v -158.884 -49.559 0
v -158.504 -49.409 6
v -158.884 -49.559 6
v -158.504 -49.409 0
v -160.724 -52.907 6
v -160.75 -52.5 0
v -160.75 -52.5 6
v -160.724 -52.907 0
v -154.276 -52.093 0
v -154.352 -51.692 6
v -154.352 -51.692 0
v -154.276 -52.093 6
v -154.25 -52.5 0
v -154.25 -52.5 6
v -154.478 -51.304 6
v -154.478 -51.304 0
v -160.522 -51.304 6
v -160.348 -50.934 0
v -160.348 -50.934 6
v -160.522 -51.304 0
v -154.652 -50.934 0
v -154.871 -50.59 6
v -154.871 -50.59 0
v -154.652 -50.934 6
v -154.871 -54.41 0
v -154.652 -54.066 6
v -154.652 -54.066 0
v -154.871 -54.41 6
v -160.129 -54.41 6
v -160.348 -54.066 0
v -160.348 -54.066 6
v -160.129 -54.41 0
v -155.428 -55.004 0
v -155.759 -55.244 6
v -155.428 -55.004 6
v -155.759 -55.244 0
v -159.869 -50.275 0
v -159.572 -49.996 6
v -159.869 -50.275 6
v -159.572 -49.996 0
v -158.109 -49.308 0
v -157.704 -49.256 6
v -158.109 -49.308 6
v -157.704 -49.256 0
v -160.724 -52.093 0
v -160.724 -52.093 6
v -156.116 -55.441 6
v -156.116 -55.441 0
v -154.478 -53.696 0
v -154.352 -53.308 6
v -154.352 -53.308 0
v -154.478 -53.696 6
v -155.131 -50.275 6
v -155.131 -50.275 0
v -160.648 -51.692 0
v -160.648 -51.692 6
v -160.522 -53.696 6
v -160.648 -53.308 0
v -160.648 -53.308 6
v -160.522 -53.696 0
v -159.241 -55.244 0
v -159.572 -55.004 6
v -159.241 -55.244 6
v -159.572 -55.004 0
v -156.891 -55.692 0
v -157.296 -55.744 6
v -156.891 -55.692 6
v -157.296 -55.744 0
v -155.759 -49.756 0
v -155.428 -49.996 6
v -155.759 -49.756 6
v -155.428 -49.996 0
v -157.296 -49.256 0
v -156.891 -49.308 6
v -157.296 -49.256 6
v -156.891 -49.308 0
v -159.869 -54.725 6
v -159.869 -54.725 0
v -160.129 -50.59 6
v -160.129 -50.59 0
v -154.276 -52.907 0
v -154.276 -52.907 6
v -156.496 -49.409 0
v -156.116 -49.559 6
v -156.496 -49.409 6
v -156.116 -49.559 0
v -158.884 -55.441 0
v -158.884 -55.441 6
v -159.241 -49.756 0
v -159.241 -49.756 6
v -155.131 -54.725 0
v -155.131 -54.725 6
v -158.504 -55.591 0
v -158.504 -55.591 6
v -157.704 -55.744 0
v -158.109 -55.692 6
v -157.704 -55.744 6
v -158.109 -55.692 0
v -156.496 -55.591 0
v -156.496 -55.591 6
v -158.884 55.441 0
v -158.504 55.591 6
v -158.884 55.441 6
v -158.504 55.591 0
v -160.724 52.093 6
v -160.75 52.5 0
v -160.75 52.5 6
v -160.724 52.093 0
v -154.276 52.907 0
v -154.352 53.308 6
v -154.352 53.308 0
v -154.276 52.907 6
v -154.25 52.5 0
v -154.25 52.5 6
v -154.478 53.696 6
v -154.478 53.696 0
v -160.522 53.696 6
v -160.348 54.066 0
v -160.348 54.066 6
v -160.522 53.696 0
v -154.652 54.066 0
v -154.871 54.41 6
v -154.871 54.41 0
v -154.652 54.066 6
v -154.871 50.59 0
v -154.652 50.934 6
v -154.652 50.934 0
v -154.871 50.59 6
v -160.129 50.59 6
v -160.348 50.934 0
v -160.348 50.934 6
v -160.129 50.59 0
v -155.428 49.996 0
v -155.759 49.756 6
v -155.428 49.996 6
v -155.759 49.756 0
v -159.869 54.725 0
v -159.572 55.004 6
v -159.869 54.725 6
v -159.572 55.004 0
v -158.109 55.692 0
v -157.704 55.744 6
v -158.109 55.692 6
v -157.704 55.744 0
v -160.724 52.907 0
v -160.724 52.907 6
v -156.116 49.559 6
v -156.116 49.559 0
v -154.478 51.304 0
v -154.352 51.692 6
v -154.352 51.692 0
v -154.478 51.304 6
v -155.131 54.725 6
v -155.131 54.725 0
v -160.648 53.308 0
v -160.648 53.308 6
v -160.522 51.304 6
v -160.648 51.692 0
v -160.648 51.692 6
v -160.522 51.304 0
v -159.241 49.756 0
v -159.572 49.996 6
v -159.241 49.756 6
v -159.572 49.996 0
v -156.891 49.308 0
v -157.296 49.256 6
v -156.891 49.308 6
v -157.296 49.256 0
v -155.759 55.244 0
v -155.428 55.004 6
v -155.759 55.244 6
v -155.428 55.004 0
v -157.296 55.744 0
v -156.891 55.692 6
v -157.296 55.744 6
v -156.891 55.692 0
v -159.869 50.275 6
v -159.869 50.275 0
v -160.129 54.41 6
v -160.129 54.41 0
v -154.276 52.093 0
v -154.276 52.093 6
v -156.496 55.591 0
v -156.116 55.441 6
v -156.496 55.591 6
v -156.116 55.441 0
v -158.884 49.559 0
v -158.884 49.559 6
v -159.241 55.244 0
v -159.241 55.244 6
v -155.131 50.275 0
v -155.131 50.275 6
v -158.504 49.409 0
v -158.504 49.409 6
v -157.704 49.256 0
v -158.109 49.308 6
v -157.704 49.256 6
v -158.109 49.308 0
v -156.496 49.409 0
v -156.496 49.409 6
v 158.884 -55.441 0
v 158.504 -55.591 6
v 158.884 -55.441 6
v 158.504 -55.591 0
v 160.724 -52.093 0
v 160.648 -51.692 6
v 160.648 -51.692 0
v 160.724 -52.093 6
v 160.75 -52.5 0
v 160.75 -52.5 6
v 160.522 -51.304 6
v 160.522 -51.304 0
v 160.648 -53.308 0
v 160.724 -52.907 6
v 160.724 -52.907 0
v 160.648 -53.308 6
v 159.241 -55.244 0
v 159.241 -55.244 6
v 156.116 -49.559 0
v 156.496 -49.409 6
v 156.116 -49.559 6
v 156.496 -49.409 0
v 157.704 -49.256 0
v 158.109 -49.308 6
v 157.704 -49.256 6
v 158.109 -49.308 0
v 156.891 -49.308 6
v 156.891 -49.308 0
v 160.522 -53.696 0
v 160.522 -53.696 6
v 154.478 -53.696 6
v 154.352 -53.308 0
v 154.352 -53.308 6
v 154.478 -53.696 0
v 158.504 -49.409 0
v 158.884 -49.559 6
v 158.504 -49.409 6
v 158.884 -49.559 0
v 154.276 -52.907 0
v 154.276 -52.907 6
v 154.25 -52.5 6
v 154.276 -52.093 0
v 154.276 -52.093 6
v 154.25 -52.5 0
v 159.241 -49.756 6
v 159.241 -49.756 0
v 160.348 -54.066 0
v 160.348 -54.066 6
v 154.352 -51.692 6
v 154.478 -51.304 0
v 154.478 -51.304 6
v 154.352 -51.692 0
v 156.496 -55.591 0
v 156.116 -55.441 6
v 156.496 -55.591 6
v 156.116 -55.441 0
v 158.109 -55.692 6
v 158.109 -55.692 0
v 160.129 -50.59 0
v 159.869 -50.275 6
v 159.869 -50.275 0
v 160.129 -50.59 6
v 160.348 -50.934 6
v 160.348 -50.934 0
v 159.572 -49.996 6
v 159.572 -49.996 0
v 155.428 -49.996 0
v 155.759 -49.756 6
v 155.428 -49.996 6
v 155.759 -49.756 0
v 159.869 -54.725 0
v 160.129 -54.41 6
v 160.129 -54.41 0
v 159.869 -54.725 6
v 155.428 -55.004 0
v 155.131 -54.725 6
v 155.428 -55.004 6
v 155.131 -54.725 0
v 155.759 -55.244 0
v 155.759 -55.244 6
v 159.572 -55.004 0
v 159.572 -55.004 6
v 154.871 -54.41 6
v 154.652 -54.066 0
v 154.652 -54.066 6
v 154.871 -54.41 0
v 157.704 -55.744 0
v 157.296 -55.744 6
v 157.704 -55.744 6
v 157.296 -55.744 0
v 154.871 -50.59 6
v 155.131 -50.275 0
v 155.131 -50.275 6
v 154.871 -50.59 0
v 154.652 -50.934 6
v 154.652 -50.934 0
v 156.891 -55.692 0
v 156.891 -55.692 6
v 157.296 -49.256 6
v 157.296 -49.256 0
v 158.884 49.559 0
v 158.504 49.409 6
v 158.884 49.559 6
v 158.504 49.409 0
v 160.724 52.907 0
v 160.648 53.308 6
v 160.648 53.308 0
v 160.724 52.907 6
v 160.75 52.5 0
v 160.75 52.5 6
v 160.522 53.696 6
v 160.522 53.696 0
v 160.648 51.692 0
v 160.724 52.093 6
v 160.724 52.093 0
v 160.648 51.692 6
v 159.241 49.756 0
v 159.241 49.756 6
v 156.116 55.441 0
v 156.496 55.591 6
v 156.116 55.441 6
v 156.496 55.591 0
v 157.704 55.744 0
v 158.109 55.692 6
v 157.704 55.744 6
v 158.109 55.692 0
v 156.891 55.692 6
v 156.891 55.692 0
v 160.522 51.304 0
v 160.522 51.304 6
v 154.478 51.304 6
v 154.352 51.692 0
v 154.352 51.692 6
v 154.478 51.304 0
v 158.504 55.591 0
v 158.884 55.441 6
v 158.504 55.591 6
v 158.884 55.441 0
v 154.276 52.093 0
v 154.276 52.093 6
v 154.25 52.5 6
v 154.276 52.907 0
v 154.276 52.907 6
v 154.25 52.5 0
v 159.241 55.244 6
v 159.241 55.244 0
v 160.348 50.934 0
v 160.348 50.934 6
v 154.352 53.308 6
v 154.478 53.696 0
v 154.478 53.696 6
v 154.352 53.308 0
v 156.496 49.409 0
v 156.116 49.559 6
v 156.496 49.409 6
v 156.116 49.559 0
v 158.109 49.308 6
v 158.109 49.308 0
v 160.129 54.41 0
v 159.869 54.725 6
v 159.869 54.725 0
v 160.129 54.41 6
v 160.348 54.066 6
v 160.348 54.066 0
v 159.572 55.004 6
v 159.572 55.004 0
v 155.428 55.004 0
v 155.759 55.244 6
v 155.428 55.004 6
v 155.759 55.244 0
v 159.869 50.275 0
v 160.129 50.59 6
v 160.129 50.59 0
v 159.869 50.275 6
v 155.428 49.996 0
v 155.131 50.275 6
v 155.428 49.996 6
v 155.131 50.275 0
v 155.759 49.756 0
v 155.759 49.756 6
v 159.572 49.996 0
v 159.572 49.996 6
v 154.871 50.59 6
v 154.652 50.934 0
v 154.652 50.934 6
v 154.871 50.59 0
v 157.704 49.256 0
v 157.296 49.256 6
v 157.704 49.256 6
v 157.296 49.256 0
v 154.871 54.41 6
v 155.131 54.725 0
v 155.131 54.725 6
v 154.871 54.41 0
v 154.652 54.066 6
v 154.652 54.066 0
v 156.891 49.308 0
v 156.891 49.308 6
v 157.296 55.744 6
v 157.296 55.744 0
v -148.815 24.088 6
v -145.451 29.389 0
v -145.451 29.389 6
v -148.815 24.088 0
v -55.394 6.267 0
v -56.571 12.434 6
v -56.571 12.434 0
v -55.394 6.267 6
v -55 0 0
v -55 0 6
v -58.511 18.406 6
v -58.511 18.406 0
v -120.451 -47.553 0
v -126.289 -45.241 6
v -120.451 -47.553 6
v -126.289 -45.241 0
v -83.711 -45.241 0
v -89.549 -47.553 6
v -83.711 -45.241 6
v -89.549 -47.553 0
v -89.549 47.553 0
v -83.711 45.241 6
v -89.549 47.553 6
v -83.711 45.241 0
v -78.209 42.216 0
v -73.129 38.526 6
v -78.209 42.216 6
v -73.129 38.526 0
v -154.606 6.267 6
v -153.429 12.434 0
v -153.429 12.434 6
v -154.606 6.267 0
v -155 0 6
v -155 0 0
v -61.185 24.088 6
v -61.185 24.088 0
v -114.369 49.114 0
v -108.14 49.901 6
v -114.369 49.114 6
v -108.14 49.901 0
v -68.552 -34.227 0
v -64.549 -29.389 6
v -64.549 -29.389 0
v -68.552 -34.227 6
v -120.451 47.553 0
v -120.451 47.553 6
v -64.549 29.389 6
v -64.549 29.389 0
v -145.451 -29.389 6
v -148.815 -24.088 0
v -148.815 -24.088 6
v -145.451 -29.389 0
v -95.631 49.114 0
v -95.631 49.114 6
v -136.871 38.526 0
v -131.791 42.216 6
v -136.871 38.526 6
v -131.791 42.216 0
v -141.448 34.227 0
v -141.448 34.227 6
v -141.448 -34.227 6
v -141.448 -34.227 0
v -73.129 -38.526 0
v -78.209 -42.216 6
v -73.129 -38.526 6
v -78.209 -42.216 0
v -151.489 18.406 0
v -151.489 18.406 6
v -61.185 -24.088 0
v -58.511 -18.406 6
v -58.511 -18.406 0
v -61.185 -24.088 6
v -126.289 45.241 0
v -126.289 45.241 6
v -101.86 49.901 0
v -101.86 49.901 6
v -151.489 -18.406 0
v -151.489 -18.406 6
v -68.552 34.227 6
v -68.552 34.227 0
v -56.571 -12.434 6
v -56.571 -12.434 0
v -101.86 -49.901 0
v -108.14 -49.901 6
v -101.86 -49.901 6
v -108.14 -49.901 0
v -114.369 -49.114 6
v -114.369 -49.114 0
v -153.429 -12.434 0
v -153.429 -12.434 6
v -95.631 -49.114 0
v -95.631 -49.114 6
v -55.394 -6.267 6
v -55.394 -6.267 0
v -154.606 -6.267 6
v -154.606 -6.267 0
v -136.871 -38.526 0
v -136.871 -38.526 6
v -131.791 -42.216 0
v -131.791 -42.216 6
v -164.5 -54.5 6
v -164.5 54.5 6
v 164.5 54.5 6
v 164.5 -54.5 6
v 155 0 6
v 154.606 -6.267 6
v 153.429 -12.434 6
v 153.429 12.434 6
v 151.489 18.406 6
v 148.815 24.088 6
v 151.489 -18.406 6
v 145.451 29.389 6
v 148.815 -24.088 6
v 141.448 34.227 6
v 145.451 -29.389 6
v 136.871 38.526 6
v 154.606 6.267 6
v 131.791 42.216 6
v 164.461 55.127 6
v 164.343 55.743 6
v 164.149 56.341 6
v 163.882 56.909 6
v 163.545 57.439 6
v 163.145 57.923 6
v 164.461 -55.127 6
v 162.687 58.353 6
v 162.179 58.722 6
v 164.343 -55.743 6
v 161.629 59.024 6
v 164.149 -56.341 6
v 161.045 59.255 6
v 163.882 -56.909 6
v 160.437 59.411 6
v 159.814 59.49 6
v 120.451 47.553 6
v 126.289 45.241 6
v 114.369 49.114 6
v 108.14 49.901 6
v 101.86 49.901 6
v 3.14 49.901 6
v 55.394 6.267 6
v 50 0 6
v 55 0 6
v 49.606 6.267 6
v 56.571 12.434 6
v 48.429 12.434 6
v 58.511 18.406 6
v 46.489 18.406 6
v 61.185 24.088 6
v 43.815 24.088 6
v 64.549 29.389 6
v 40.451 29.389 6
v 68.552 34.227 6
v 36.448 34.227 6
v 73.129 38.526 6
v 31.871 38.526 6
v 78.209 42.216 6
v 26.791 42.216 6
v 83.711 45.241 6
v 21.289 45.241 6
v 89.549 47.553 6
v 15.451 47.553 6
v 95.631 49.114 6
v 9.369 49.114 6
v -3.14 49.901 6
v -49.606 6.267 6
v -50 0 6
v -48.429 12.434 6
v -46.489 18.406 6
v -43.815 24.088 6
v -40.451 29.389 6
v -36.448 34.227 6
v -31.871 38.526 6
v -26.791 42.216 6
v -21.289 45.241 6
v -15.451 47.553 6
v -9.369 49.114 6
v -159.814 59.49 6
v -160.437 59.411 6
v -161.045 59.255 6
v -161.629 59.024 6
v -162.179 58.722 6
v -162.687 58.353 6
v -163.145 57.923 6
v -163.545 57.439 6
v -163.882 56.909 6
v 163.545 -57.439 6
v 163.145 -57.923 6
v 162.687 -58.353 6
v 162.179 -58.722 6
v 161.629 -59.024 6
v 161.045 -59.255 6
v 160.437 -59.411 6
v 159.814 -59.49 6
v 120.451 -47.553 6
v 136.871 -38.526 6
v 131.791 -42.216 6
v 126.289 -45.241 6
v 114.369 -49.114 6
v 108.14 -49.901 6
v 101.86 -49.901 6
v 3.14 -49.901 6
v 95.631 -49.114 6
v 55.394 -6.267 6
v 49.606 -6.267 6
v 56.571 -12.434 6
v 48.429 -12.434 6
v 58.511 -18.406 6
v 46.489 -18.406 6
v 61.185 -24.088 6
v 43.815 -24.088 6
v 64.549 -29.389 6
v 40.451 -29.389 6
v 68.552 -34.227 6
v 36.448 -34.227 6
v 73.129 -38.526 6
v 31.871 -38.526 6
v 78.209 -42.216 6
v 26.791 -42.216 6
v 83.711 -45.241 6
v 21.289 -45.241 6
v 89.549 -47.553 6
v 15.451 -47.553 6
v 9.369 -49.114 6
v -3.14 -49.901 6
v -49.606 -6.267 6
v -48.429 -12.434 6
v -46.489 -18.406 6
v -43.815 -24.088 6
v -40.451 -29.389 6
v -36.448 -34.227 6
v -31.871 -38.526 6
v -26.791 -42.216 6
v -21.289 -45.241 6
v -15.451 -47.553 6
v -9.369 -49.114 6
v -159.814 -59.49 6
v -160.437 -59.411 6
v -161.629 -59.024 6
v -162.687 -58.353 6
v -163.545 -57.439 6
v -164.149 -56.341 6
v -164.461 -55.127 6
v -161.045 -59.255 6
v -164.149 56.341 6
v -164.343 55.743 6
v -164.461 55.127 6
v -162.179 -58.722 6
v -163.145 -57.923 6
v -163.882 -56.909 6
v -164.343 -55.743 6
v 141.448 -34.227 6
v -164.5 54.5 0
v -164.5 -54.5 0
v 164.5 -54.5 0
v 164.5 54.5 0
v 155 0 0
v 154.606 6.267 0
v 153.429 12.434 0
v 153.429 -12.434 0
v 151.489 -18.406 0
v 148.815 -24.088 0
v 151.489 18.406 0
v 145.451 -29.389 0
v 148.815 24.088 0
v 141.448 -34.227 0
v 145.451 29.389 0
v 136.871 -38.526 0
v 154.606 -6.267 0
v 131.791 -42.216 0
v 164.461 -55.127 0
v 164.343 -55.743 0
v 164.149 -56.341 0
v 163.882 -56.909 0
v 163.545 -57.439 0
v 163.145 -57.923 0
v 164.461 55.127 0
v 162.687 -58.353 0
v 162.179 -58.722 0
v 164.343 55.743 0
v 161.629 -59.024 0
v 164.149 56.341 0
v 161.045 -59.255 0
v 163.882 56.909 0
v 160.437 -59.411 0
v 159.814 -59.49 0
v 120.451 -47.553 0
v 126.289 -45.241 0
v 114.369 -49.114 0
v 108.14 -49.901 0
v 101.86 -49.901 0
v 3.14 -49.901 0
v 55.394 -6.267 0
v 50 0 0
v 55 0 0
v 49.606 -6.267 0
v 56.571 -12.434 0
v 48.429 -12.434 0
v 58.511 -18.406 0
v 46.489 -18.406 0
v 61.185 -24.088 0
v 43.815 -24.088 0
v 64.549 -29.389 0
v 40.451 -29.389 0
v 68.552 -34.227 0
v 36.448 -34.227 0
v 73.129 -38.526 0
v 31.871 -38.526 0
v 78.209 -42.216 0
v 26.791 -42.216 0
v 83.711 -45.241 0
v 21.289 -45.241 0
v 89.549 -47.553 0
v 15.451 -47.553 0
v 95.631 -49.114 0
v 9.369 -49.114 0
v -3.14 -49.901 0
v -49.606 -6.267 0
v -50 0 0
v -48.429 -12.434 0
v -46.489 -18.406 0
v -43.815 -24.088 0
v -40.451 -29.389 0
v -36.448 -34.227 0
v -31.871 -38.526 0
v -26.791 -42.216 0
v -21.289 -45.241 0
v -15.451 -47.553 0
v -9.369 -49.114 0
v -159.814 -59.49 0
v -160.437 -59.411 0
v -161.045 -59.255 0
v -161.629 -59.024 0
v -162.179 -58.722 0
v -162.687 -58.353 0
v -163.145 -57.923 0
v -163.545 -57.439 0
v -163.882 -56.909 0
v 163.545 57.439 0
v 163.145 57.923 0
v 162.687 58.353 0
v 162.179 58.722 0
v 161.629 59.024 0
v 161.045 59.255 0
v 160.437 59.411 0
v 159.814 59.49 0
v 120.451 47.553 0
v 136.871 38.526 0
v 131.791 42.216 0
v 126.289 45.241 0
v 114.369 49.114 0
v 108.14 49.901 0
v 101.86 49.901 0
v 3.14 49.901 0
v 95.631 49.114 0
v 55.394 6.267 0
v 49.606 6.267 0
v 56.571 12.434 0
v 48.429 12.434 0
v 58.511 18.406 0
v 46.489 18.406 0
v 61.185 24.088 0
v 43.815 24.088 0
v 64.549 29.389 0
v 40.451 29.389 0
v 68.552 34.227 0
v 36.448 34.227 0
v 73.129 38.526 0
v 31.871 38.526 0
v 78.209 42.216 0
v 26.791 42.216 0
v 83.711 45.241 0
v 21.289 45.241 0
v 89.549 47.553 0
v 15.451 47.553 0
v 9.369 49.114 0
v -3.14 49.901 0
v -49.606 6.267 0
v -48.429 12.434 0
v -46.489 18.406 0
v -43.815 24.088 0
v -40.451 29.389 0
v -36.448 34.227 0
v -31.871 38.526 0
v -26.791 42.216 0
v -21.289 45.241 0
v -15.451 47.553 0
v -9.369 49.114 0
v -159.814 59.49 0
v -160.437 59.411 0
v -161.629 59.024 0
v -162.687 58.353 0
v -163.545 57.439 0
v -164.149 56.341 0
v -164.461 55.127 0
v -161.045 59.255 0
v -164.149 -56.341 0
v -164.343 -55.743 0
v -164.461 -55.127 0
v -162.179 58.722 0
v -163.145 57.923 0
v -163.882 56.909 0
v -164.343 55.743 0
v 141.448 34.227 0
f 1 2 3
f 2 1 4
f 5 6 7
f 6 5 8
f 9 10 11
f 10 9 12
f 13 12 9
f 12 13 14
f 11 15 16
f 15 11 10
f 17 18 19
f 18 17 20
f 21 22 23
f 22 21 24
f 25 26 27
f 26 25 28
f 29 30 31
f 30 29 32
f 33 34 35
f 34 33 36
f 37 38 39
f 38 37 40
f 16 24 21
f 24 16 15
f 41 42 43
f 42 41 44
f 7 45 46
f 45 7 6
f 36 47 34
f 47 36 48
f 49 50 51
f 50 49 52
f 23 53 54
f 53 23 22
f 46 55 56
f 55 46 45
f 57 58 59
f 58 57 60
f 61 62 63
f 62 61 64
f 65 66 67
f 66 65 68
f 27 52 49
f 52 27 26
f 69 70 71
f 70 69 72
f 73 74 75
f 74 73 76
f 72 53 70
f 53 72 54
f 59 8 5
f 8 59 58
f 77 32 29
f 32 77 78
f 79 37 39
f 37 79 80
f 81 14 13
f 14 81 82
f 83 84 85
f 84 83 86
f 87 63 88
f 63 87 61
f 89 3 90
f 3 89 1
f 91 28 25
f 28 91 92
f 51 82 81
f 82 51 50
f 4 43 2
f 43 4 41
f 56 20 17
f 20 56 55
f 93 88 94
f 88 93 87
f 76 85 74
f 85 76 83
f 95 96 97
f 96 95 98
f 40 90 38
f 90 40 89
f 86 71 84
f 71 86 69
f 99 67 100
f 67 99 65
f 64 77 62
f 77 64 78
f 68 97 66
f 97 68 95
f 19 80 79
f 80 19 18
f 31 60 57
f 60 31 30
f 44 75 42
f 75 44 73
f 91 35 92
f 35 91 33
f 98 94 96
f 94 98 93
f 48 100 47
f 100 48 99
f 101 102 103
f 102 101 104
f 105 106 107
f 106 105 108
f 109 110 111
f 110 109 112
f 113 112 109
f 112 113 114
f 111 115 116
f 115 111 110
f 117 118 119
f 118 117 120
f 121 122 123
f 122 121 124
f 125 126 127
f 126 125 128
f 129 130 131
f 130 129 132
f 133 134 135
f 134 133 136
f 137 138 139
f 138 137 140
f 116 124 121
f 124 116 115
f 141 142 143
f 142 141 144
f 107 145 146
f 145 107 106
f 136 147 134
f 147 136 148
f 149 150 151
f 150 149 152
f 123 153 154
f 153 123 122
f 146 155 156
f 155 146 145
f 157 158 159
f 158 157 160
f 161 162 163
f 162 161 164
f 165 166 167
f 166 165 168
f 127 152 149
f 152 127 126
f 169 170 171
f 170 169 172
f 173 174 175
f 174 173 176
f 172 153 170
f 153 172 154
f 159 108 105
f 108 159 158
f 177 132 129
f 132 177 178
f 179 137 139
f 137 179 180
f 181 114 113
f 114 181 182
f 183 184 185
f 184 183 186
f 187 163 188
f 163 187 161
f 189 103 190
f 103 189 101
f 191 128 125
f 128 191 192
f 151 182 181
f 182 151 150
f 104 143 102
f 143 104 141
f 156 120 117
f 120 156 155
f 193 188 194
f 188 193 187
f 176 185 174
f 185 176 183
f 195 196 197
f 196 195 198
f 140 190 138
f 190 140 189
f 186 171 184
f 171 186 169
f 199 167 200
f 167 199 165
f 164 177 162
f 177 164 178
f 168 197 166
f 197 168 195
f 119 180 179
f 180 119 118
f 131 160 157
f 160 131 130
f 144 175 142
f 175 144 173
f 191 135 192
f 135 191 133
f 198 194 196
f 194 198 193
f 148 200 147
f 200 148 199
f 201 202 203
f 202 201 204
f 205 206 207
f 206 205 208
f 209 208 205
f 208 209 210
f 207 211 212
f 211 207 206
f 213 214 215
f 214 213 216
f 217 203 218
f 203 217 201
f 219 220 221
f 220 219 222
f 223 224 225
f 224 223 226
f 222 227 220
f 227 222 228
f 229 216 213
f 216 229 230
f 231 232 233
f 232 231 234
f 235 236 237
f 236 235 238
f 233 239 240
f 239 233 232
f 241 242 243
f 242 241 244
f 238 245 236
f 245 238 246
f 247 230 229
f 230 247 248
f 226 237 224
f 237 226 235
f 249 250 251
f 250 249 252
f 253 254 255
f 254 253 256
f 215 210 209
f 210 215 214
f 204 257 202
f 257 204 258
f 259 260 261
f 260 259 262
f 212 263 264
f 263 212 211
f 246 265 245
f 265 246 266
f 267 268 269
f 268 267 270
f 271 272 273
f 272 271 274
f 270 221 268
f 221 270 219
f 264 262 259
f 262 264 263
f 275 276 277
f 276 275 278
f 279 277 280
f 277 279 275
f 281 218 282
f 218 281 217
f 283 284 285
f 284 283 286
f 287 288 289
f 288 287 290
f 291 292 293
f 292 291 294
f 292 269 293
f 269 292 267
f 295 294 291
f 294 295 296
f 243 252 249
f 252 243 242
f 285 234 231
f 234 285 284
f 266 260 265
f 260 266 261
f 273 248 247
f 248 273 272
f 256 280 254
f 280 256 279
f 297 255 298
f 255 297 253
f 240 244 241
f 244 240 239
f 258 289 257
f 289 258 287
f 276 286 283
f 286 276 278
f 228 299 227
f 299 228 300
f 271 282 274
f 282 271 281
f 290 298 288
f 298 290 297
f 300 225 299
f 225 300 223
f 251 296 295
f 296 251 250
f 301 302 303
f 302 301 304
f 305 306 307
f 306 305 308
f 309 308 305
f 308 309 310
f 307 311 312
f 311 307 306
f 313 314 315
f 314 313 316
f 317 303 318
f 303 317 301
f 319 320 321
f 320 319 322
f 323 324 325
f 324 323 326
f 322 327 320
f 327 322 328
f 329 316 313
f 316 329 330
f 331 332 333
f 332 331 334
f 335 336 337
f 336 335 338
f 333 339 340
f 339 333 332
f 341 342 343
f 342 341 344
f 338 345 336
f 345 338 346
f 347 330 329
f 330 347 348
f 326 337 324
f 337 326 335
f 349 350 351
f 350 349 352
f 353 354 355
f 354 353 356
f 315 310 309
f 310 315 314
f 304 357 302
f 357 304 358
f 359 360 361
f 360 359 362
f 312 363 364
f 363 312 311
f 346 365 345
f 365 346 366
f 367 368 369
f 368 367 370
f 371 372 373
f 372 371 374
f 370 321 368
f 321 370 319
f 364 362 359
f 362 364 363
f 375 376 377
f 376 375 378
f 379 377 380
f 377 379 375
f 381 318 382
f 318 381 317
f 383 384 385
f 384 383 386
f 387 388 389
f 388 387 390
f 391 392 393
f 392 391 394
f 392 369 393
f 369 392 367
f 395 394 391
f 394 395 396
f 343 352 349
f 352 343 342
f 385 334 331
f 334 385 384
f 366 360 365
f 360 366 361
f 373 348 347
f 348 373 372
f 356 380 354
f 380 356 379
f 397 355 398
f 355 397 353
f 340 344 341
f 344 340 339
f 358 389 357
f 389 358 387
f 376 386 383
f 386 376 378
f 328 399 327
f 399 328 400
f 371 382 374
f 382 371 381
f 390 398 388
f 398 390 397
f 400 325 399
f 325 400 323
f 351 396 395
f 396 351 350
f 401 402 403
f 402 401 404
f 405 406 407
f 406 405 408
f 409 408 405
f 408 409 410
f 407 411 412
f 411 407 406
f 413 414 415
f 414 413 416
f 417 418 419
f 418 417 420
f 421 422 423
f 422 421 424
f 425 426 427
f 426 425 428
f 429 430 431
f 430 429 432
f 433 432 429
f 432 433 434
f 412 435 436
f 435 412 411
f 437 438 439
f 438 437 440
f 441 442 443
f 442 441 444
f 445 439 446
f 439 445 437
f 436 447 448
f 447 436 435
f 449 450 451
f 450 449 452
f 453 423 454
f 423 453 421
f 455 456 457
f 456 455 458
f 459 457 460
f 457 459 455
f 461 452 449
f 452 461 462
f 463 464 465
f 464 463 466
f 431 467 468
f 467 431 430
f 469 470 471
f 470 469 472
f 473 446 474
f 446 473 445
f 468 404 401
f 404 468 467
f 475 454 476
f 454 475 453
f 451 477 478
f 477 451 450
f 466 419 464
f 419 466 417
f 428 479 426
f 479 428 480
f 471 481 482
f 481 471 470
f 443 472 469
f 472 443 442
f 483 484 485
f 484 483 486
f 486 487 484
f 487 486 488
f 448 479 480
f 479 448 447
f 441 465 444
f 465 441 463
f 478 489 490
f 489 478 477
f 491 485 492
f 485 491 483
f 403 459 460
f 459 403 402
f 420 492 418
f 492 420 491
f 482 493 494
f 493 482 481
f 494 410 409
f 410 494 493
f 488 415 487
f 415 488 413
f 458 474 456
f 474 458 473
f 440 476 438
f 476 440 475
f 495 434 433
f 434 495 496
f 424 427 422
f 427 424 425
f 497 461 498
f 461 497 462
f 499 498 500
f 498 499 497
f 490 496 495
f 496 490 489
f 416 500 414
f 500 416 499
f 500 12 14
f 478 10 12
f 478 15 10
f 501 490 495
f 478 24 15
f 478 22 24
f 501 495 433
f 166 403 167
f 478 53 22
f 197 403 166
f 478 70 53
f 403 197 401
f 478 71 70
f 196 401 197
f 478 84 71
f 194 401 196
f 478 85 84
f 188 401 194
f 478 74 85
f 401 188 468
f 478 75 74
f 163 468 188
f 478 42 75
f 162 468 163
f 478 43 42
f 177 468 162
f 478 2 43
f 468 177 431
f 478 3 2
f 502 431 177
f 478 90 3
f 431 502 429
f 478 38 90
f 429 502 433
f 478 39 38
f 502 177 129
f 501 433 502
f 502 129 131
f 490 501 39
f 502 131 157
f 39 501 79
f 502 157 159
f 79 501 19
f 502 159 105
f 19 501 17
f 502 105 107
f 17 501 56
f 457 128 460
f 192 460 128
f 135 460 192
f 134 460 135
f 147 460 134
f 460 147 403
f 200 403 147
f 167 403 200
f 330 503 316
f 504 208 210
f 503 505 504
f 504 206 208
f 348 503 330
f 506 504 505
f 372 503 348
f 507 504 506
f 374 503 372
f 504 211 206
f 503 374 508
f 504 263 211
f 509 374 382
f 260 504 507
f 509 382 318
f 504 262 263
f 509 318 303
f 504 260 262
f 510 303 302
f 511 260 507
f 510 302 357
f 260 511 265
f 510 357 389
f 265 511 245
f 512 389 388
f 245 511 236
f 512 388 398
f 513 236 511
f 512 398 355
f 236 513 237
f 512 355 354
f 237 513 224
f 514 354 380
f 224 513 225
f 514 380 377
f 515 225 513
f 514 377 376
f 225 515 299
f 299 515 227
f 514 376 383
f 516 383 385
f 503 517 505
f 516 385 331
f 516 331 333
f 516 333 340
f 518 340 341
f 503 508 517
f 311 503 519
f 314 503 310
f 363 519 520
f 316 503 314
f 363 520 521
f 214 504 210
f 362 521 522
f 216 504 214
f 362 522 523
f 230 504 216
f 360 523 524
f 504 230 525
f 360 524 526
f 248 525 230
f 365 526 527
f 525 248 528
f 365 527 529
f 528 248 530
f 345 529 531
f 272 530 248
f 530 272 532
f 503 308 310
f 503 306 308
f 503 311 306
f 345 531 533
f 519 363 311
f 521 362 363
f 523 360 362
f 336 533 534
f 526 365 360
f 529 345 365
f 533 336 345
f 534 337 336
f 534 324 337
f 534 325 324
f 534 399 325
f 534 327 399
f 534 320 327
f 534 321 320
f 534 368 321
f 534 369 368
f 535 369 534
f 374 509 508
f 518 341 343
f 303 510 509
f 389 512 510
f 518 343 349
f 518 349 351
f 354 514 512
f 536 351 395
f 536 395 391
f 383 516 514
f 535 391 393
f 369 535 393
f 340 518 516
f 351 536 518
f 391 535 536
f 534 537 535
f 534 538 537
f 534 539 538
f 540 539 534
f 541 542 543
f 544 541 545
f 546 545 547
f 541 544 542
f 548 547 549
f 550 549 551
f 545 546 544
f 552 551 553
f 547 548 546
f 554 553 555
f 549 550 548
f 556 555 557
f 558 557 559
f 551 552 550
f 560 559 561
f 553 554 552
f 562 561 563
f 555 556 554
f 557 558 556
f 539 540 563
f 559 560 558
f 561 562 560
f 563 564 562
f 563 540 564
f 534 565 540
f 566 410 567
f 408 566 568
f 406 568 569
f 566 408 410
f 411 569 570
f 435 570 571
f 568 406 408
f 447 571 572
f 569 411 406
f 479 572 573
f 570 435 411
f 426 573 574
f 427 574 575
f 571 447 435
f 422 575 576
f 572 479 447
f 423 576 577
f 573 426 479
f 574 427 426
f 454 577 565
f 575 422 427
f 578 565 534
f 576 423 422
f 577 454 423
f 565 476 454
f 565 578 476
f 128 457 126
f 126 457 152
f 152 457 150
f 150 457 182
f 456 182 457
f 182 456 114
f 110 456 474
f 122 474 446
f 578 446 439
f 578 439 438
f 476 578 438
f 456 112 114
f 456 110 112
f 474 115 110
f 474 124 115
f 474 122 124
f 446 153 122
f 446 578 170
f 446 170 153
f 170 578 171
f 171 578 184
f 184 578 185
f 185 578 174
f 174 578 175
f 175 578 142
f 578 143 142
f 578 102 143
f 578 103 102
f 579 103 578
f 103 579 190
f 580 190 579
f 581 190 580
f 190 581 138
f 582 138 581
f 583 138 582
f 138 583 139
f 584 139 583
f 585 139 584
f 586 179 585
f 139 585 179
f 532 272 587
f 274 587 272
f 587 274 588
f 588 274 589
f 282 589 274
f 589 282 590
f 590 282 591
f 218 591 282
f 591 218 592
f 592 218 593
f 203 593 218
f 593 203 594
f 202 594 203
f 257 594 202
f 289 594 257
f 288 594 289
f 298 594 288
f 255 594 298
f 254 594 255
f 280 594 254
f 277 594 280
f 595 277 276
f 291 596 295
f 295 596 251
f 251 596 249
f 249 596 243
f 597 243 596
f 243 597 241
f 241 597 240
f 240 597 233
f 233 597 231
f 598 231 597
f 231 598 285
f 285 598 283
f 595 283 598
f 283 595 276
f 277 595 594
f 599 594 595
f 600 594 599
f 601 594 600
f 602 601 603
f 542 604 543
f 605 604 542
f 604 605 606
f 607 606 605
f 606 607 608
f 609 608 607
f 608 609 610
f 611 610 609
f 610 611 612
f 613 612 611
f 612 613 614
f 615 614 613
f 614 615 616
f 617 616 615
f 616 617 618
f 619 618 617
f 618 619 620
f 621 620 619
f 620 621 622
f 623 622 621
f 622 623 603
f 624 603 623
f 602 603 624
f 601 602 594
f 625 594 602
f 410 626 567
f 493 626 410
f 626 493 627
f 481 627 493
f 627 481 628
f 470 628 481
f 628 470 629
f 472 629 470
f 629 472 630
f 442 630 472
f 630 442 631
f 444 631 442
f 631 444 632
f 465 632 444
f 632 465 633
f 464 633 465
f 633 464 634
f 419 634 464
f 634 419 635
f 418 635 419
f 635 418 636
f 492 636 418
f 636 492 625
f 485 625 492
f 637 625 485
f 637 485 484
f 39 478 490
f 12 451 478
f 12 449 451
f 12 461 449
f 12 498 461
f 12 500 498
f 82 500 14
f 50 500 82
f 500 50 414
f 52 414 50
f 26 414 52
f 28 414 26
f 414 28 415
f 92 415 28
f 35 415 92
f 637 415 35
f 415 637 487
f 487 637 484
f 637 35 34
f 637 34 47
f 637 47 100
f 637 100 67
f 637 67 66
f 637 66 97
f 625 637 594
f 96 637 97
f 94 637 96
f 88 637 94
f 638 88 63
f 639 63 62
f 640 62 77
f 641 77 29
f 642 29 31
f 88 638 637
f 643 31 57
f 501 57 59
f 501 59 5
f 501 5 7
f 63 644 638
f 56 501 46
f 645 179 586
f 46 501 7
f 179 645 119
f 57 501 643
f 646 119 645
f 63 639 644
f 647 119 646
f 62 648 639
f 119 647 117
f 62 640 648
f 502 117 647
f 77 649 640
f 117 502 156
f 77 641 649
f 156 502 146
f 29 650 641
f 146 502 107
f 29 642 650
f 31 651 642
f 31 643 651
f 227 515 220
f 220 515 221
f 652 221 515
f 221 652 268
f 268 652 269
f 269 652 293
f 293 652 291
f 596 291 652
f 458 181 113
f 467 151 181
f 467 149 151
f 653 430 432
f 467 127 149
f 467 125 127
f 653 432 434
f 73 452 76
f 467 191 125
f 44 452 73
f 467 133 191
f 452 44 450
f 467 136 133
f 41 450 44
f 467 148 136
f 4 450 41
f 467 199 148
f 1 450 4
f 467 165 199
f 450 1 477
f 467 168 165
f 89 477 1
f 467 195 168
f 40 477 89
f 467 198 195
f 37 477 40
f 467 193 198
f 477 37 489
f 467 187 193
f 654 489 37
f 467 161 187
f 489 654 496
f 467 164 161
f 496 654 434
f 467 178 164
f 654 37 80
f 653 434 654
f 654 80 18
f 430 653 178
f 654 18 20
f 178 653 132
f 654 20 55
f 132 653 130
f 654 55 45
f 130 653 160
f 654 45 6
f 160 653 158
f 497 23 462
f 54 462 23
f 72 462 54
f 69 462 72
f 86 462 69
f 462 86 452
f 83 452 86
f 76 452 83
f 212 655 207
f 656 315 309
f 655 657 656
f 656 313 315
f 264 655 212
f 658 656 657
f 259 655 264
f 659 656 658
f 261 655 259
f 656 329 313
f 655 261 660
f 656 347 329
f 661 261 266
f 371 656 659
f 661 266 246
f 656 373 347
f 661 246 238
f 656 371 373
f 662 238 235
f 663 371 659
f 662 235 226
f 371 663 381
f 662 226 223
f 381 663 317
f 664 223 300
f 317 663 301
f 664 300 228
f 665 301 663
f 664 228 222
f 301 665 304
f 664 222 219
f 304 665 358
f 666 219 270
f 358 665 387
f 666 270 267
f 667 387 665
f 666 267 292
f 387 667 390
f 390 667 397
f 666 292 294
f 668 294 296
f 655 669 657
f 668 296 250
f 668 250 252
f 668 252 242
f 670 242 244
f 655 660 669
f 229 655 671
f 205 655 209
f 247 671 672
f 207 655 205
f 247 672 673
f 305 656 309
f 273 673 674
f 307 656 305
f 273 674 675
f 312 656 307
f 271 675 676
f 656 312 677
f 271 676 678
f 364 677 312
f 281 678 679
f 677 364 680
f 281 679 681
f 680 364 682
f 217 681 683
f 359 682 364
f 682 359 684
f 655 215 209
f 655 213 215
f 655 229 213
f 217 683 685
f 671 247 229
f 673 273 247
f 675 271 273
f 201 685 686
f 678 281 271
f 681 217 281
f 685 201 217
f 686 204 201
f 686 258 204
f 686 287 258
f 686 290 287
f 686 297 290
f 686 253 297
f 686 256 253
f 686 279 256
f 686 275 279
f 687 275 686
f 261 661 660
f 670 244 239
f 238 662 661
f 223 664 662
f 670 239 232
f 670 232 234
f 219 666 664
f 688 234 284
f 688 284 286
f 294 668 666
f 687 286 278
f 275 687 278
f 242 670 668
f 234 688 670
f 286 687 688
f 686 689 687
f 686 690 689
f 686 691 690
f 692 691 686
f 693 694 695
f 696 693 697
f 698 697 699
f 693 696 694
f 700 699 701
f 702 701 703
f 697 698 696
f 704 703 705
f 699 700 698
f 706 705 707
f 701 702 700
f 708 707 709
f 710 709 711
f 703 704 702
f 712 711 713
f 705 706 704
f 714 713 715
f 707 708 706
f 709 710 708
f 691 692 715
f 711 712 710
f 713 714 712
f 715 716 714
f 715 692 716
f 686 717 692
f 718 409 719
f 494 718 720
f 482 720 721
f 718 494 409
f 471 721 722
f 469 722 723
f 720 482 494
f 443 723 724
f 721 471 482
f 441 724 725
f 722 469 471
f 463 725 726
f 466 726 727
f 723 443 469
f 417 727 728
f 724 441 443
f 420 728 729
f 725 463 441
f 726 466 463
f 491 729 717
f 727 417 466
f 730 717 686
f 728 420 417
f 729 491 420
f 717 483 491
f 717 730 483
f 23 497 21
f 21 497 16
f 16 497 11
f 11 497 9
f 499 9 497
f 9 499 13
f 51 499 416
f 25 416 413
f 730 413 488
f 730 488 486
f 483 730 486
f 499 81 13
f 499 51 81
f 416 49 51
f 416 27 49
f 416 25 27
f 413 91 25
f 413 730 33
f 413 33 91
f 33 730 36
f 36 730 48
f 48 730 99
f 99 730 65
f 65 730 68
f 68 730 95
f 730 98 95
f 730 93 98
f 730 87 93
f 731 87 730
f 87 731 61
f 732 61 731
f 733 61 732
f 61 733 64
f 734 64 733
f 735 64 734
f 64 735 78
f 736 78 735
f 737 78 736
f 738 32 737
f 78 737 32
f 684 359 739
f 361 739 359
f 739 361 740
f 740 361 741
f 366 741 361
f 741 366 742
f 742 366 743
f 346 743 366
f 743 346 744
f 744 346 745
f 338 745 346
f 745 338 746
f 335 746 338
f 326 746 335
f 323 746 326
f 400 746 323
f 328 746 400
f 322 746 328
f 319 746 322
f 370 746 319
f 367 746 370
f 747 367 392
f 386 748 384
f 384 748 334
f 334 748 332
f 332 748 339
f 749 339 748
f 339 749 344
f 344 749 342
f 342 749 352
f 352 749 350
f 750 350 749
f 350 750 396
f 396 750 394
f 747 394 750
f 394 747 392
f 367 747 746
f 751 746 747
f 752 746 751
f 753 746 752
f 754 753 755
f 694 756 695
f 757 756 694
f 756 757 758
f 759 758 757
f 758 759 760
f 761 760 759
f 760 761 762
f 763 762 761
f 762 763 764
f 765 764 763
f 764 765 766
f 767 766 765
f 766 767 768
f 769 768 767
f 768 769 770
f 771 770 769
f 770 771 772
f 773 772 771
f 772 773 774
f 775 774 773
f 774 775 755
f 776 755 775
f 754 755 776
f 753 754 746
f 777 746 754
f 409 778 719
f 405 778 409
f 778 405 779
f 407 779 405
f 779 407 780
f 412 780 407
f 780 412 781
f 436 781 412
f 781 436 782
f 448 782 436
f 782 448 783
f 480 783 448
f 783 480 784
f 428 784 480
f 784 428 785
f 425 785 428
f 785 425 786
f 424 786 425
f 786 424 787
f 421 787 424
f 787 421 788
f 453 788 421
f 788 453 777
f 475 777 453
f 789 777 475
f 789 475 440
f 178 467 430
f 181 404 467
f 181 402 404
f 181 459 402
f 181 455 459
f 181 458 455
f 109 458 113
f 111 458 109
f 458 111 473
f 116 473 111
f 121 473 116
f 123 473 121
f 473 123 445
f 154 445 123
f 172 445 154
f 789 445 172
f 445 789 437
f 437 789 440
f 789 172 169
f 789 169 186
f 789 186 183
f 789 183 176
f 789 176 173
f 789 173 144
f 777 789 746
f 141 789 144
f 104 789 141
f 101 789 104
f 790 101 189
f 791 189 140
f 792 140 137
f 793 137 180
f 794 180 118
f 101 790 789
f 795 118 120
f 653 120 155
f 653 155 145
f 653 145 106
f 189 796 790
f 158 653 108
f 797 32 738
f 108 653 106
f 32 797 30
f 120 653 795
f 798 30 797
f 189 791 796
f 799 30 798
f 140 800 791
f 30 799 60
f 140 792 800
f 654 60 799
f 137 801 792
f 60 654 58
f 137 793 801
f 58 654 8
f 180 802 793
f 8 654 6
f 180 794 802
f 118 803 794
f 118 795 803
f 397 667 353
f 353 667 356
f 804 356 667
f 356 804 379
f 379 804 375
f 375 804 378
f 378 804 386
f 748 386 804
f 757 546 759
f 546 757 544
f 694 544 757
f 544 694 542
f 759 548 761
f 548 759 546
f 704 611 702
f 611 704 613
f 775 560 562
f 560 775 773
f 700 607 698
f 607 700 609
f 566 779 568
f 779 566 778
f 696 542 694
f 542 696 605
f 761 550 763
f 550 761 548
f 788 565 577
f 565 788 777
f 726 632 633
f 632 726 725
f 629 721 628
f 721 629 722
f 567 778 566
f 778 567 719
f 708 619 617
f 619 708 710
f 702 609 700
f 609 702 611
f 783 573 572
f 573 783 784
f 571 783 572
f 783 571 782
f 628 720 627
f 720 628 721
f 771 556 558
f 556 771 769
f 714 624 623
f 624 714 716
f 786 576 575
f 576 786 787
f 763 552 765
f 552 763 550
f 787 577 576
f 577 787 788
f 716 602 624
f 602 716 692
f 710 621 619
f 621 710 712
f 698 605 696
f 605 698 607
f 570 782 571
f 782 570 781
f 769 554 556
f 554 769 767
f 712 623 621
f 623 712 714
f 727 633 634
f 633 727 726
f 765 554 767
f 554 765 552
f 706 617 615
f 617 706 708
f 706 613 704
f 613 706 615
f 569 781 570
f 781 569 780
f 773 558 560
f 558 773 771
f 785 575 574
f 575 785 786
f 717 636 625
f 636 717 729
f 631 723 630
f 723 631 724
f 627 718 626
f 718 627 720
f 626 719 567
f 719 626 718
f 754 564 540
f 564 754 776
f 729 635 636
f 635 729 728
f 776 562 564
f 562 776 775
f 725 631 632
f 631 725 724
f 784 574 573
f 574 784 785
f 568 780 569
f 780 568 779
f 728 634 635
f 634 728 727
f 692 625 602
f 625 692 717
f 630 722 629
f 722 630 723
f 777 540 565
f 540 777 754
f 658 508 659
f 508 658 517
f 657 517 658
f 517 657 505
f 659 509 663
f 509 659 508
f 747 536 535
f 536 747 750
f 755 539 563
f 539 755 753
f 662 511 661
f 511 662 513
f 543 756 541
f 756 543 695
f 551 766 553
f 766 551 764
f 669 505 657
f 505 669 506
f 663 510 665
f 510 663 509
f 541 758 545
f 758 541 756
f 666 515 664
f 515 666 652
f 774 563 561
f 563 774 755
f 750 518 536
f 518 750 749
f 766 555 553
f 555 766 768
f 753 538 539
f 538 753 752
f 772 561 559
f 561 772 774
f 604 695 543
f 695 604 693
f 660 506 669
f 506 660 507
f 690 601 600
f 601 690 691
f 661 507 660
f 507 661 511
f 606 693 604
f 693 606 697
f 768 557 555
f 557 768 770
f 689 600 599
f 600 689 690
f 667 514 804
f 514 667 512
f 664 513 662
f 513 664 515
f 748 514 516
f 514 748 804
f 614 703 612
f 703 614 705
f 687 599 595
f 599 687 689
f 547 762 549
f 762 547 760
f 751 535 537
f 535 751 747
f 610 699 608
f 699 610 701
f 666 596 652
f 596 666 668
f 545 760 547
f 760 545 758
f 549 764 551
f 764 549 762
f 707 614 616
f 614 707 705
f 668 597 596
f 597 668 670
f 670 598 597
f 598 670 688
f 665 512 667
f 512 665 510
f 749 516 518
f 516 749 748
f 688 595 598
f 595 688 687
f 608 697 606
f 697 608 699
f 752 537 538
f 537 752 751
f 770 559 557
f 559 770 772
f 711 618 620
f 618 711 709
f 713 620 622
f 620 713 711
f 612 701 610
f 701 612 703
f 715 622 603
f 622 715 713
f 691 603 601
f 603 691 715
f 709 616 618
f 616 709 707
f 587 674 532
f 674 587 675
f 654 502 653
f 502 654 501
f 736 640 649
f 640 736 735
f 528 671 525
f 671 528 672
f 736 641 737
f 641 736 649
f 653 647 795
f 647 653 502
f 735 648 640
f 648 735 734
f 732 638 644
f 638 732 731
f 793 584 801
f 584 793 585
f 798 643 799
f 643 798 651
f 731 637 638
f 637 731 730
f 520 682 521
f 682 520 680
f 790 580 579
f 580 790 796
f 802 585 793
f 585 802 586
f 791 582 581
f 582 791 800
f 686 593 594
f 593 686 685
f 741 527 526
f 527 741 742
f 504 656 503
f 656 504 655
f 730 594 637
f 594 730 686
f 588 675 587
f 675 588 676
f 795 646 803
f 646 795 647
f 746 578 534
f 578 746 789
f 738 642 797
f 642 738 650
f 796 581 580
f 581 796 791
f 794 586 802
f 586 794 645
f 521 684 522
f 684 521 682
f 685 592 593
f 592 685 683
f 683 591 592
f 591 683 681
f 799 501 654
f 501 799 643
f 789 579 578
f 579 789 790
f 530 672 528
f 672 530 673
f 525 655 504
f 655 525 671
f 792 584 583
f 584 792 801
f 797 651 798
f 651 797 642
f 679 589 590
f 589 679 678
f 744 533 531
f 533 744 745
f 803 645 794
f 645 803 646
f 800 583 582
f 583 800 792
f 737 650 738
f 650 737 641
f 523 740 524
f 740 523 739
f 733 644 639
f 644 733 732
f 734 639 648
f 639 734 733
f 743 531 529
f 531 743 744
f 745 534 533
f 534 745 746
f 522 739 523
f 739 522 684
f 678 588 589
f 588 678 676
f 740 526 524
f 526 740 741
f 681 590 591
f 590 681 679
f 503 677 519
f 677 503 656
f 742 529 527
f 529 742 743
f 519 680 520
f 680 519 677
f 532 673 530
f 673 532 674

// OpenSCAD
$fn = 50;


difference() {
	union() {
		hull() {
			translate(v = [-159.5000000000, 54.5000000000, 0]) {
				cylinder(h = 6, r = 5);
			}
			translate(v = [159.5000000000, 54.5000000000, 0]) {
				cylinder(h = 6, r = 5);
			}
			translate(v = [-159.5000000000, -54.5000000000, 0]) {
				cylinder(h = 6, r = 5);
			}
			translate(v = [159.5000000000, -54.5000000000, 0]) {
				cylinder(h = 6, r = 5);
			}
		}
	}
	union() {
		#translate(v = [-157.5000000000, -52.5000000000, -100.0000000000]) {
			cylinder(h = 200, r = 3.2500000000);
		}
		#translate(v = [-157.5000000000, 52.5000000000, -100.0000000000]) {
			cylinder(h = 200, r = 3.2500000000);
		}
		#translate(v = [157.5000000000, -52.5000000000, -100.0000000000]) {
			cylinder(h = 200, r = 3.2500000000);
		}
		#translate(v = [157.5000000000, 52.5000000000, -100.0000000000]) {
			cylinder(h = 200, r = 3.2500000000);
		}
		#translate(v = [-105.0000000000, 0, 0]) {
			cylinder(h = 6, r = 50.0000000000);
		}
		#cylinder(h = 6, r = 50.0000000000);
		#translate(v = [105.0000000000, 0, 0]) {
			cylinder(h = 6, r = 50.0000000000);
		}
	}
}
